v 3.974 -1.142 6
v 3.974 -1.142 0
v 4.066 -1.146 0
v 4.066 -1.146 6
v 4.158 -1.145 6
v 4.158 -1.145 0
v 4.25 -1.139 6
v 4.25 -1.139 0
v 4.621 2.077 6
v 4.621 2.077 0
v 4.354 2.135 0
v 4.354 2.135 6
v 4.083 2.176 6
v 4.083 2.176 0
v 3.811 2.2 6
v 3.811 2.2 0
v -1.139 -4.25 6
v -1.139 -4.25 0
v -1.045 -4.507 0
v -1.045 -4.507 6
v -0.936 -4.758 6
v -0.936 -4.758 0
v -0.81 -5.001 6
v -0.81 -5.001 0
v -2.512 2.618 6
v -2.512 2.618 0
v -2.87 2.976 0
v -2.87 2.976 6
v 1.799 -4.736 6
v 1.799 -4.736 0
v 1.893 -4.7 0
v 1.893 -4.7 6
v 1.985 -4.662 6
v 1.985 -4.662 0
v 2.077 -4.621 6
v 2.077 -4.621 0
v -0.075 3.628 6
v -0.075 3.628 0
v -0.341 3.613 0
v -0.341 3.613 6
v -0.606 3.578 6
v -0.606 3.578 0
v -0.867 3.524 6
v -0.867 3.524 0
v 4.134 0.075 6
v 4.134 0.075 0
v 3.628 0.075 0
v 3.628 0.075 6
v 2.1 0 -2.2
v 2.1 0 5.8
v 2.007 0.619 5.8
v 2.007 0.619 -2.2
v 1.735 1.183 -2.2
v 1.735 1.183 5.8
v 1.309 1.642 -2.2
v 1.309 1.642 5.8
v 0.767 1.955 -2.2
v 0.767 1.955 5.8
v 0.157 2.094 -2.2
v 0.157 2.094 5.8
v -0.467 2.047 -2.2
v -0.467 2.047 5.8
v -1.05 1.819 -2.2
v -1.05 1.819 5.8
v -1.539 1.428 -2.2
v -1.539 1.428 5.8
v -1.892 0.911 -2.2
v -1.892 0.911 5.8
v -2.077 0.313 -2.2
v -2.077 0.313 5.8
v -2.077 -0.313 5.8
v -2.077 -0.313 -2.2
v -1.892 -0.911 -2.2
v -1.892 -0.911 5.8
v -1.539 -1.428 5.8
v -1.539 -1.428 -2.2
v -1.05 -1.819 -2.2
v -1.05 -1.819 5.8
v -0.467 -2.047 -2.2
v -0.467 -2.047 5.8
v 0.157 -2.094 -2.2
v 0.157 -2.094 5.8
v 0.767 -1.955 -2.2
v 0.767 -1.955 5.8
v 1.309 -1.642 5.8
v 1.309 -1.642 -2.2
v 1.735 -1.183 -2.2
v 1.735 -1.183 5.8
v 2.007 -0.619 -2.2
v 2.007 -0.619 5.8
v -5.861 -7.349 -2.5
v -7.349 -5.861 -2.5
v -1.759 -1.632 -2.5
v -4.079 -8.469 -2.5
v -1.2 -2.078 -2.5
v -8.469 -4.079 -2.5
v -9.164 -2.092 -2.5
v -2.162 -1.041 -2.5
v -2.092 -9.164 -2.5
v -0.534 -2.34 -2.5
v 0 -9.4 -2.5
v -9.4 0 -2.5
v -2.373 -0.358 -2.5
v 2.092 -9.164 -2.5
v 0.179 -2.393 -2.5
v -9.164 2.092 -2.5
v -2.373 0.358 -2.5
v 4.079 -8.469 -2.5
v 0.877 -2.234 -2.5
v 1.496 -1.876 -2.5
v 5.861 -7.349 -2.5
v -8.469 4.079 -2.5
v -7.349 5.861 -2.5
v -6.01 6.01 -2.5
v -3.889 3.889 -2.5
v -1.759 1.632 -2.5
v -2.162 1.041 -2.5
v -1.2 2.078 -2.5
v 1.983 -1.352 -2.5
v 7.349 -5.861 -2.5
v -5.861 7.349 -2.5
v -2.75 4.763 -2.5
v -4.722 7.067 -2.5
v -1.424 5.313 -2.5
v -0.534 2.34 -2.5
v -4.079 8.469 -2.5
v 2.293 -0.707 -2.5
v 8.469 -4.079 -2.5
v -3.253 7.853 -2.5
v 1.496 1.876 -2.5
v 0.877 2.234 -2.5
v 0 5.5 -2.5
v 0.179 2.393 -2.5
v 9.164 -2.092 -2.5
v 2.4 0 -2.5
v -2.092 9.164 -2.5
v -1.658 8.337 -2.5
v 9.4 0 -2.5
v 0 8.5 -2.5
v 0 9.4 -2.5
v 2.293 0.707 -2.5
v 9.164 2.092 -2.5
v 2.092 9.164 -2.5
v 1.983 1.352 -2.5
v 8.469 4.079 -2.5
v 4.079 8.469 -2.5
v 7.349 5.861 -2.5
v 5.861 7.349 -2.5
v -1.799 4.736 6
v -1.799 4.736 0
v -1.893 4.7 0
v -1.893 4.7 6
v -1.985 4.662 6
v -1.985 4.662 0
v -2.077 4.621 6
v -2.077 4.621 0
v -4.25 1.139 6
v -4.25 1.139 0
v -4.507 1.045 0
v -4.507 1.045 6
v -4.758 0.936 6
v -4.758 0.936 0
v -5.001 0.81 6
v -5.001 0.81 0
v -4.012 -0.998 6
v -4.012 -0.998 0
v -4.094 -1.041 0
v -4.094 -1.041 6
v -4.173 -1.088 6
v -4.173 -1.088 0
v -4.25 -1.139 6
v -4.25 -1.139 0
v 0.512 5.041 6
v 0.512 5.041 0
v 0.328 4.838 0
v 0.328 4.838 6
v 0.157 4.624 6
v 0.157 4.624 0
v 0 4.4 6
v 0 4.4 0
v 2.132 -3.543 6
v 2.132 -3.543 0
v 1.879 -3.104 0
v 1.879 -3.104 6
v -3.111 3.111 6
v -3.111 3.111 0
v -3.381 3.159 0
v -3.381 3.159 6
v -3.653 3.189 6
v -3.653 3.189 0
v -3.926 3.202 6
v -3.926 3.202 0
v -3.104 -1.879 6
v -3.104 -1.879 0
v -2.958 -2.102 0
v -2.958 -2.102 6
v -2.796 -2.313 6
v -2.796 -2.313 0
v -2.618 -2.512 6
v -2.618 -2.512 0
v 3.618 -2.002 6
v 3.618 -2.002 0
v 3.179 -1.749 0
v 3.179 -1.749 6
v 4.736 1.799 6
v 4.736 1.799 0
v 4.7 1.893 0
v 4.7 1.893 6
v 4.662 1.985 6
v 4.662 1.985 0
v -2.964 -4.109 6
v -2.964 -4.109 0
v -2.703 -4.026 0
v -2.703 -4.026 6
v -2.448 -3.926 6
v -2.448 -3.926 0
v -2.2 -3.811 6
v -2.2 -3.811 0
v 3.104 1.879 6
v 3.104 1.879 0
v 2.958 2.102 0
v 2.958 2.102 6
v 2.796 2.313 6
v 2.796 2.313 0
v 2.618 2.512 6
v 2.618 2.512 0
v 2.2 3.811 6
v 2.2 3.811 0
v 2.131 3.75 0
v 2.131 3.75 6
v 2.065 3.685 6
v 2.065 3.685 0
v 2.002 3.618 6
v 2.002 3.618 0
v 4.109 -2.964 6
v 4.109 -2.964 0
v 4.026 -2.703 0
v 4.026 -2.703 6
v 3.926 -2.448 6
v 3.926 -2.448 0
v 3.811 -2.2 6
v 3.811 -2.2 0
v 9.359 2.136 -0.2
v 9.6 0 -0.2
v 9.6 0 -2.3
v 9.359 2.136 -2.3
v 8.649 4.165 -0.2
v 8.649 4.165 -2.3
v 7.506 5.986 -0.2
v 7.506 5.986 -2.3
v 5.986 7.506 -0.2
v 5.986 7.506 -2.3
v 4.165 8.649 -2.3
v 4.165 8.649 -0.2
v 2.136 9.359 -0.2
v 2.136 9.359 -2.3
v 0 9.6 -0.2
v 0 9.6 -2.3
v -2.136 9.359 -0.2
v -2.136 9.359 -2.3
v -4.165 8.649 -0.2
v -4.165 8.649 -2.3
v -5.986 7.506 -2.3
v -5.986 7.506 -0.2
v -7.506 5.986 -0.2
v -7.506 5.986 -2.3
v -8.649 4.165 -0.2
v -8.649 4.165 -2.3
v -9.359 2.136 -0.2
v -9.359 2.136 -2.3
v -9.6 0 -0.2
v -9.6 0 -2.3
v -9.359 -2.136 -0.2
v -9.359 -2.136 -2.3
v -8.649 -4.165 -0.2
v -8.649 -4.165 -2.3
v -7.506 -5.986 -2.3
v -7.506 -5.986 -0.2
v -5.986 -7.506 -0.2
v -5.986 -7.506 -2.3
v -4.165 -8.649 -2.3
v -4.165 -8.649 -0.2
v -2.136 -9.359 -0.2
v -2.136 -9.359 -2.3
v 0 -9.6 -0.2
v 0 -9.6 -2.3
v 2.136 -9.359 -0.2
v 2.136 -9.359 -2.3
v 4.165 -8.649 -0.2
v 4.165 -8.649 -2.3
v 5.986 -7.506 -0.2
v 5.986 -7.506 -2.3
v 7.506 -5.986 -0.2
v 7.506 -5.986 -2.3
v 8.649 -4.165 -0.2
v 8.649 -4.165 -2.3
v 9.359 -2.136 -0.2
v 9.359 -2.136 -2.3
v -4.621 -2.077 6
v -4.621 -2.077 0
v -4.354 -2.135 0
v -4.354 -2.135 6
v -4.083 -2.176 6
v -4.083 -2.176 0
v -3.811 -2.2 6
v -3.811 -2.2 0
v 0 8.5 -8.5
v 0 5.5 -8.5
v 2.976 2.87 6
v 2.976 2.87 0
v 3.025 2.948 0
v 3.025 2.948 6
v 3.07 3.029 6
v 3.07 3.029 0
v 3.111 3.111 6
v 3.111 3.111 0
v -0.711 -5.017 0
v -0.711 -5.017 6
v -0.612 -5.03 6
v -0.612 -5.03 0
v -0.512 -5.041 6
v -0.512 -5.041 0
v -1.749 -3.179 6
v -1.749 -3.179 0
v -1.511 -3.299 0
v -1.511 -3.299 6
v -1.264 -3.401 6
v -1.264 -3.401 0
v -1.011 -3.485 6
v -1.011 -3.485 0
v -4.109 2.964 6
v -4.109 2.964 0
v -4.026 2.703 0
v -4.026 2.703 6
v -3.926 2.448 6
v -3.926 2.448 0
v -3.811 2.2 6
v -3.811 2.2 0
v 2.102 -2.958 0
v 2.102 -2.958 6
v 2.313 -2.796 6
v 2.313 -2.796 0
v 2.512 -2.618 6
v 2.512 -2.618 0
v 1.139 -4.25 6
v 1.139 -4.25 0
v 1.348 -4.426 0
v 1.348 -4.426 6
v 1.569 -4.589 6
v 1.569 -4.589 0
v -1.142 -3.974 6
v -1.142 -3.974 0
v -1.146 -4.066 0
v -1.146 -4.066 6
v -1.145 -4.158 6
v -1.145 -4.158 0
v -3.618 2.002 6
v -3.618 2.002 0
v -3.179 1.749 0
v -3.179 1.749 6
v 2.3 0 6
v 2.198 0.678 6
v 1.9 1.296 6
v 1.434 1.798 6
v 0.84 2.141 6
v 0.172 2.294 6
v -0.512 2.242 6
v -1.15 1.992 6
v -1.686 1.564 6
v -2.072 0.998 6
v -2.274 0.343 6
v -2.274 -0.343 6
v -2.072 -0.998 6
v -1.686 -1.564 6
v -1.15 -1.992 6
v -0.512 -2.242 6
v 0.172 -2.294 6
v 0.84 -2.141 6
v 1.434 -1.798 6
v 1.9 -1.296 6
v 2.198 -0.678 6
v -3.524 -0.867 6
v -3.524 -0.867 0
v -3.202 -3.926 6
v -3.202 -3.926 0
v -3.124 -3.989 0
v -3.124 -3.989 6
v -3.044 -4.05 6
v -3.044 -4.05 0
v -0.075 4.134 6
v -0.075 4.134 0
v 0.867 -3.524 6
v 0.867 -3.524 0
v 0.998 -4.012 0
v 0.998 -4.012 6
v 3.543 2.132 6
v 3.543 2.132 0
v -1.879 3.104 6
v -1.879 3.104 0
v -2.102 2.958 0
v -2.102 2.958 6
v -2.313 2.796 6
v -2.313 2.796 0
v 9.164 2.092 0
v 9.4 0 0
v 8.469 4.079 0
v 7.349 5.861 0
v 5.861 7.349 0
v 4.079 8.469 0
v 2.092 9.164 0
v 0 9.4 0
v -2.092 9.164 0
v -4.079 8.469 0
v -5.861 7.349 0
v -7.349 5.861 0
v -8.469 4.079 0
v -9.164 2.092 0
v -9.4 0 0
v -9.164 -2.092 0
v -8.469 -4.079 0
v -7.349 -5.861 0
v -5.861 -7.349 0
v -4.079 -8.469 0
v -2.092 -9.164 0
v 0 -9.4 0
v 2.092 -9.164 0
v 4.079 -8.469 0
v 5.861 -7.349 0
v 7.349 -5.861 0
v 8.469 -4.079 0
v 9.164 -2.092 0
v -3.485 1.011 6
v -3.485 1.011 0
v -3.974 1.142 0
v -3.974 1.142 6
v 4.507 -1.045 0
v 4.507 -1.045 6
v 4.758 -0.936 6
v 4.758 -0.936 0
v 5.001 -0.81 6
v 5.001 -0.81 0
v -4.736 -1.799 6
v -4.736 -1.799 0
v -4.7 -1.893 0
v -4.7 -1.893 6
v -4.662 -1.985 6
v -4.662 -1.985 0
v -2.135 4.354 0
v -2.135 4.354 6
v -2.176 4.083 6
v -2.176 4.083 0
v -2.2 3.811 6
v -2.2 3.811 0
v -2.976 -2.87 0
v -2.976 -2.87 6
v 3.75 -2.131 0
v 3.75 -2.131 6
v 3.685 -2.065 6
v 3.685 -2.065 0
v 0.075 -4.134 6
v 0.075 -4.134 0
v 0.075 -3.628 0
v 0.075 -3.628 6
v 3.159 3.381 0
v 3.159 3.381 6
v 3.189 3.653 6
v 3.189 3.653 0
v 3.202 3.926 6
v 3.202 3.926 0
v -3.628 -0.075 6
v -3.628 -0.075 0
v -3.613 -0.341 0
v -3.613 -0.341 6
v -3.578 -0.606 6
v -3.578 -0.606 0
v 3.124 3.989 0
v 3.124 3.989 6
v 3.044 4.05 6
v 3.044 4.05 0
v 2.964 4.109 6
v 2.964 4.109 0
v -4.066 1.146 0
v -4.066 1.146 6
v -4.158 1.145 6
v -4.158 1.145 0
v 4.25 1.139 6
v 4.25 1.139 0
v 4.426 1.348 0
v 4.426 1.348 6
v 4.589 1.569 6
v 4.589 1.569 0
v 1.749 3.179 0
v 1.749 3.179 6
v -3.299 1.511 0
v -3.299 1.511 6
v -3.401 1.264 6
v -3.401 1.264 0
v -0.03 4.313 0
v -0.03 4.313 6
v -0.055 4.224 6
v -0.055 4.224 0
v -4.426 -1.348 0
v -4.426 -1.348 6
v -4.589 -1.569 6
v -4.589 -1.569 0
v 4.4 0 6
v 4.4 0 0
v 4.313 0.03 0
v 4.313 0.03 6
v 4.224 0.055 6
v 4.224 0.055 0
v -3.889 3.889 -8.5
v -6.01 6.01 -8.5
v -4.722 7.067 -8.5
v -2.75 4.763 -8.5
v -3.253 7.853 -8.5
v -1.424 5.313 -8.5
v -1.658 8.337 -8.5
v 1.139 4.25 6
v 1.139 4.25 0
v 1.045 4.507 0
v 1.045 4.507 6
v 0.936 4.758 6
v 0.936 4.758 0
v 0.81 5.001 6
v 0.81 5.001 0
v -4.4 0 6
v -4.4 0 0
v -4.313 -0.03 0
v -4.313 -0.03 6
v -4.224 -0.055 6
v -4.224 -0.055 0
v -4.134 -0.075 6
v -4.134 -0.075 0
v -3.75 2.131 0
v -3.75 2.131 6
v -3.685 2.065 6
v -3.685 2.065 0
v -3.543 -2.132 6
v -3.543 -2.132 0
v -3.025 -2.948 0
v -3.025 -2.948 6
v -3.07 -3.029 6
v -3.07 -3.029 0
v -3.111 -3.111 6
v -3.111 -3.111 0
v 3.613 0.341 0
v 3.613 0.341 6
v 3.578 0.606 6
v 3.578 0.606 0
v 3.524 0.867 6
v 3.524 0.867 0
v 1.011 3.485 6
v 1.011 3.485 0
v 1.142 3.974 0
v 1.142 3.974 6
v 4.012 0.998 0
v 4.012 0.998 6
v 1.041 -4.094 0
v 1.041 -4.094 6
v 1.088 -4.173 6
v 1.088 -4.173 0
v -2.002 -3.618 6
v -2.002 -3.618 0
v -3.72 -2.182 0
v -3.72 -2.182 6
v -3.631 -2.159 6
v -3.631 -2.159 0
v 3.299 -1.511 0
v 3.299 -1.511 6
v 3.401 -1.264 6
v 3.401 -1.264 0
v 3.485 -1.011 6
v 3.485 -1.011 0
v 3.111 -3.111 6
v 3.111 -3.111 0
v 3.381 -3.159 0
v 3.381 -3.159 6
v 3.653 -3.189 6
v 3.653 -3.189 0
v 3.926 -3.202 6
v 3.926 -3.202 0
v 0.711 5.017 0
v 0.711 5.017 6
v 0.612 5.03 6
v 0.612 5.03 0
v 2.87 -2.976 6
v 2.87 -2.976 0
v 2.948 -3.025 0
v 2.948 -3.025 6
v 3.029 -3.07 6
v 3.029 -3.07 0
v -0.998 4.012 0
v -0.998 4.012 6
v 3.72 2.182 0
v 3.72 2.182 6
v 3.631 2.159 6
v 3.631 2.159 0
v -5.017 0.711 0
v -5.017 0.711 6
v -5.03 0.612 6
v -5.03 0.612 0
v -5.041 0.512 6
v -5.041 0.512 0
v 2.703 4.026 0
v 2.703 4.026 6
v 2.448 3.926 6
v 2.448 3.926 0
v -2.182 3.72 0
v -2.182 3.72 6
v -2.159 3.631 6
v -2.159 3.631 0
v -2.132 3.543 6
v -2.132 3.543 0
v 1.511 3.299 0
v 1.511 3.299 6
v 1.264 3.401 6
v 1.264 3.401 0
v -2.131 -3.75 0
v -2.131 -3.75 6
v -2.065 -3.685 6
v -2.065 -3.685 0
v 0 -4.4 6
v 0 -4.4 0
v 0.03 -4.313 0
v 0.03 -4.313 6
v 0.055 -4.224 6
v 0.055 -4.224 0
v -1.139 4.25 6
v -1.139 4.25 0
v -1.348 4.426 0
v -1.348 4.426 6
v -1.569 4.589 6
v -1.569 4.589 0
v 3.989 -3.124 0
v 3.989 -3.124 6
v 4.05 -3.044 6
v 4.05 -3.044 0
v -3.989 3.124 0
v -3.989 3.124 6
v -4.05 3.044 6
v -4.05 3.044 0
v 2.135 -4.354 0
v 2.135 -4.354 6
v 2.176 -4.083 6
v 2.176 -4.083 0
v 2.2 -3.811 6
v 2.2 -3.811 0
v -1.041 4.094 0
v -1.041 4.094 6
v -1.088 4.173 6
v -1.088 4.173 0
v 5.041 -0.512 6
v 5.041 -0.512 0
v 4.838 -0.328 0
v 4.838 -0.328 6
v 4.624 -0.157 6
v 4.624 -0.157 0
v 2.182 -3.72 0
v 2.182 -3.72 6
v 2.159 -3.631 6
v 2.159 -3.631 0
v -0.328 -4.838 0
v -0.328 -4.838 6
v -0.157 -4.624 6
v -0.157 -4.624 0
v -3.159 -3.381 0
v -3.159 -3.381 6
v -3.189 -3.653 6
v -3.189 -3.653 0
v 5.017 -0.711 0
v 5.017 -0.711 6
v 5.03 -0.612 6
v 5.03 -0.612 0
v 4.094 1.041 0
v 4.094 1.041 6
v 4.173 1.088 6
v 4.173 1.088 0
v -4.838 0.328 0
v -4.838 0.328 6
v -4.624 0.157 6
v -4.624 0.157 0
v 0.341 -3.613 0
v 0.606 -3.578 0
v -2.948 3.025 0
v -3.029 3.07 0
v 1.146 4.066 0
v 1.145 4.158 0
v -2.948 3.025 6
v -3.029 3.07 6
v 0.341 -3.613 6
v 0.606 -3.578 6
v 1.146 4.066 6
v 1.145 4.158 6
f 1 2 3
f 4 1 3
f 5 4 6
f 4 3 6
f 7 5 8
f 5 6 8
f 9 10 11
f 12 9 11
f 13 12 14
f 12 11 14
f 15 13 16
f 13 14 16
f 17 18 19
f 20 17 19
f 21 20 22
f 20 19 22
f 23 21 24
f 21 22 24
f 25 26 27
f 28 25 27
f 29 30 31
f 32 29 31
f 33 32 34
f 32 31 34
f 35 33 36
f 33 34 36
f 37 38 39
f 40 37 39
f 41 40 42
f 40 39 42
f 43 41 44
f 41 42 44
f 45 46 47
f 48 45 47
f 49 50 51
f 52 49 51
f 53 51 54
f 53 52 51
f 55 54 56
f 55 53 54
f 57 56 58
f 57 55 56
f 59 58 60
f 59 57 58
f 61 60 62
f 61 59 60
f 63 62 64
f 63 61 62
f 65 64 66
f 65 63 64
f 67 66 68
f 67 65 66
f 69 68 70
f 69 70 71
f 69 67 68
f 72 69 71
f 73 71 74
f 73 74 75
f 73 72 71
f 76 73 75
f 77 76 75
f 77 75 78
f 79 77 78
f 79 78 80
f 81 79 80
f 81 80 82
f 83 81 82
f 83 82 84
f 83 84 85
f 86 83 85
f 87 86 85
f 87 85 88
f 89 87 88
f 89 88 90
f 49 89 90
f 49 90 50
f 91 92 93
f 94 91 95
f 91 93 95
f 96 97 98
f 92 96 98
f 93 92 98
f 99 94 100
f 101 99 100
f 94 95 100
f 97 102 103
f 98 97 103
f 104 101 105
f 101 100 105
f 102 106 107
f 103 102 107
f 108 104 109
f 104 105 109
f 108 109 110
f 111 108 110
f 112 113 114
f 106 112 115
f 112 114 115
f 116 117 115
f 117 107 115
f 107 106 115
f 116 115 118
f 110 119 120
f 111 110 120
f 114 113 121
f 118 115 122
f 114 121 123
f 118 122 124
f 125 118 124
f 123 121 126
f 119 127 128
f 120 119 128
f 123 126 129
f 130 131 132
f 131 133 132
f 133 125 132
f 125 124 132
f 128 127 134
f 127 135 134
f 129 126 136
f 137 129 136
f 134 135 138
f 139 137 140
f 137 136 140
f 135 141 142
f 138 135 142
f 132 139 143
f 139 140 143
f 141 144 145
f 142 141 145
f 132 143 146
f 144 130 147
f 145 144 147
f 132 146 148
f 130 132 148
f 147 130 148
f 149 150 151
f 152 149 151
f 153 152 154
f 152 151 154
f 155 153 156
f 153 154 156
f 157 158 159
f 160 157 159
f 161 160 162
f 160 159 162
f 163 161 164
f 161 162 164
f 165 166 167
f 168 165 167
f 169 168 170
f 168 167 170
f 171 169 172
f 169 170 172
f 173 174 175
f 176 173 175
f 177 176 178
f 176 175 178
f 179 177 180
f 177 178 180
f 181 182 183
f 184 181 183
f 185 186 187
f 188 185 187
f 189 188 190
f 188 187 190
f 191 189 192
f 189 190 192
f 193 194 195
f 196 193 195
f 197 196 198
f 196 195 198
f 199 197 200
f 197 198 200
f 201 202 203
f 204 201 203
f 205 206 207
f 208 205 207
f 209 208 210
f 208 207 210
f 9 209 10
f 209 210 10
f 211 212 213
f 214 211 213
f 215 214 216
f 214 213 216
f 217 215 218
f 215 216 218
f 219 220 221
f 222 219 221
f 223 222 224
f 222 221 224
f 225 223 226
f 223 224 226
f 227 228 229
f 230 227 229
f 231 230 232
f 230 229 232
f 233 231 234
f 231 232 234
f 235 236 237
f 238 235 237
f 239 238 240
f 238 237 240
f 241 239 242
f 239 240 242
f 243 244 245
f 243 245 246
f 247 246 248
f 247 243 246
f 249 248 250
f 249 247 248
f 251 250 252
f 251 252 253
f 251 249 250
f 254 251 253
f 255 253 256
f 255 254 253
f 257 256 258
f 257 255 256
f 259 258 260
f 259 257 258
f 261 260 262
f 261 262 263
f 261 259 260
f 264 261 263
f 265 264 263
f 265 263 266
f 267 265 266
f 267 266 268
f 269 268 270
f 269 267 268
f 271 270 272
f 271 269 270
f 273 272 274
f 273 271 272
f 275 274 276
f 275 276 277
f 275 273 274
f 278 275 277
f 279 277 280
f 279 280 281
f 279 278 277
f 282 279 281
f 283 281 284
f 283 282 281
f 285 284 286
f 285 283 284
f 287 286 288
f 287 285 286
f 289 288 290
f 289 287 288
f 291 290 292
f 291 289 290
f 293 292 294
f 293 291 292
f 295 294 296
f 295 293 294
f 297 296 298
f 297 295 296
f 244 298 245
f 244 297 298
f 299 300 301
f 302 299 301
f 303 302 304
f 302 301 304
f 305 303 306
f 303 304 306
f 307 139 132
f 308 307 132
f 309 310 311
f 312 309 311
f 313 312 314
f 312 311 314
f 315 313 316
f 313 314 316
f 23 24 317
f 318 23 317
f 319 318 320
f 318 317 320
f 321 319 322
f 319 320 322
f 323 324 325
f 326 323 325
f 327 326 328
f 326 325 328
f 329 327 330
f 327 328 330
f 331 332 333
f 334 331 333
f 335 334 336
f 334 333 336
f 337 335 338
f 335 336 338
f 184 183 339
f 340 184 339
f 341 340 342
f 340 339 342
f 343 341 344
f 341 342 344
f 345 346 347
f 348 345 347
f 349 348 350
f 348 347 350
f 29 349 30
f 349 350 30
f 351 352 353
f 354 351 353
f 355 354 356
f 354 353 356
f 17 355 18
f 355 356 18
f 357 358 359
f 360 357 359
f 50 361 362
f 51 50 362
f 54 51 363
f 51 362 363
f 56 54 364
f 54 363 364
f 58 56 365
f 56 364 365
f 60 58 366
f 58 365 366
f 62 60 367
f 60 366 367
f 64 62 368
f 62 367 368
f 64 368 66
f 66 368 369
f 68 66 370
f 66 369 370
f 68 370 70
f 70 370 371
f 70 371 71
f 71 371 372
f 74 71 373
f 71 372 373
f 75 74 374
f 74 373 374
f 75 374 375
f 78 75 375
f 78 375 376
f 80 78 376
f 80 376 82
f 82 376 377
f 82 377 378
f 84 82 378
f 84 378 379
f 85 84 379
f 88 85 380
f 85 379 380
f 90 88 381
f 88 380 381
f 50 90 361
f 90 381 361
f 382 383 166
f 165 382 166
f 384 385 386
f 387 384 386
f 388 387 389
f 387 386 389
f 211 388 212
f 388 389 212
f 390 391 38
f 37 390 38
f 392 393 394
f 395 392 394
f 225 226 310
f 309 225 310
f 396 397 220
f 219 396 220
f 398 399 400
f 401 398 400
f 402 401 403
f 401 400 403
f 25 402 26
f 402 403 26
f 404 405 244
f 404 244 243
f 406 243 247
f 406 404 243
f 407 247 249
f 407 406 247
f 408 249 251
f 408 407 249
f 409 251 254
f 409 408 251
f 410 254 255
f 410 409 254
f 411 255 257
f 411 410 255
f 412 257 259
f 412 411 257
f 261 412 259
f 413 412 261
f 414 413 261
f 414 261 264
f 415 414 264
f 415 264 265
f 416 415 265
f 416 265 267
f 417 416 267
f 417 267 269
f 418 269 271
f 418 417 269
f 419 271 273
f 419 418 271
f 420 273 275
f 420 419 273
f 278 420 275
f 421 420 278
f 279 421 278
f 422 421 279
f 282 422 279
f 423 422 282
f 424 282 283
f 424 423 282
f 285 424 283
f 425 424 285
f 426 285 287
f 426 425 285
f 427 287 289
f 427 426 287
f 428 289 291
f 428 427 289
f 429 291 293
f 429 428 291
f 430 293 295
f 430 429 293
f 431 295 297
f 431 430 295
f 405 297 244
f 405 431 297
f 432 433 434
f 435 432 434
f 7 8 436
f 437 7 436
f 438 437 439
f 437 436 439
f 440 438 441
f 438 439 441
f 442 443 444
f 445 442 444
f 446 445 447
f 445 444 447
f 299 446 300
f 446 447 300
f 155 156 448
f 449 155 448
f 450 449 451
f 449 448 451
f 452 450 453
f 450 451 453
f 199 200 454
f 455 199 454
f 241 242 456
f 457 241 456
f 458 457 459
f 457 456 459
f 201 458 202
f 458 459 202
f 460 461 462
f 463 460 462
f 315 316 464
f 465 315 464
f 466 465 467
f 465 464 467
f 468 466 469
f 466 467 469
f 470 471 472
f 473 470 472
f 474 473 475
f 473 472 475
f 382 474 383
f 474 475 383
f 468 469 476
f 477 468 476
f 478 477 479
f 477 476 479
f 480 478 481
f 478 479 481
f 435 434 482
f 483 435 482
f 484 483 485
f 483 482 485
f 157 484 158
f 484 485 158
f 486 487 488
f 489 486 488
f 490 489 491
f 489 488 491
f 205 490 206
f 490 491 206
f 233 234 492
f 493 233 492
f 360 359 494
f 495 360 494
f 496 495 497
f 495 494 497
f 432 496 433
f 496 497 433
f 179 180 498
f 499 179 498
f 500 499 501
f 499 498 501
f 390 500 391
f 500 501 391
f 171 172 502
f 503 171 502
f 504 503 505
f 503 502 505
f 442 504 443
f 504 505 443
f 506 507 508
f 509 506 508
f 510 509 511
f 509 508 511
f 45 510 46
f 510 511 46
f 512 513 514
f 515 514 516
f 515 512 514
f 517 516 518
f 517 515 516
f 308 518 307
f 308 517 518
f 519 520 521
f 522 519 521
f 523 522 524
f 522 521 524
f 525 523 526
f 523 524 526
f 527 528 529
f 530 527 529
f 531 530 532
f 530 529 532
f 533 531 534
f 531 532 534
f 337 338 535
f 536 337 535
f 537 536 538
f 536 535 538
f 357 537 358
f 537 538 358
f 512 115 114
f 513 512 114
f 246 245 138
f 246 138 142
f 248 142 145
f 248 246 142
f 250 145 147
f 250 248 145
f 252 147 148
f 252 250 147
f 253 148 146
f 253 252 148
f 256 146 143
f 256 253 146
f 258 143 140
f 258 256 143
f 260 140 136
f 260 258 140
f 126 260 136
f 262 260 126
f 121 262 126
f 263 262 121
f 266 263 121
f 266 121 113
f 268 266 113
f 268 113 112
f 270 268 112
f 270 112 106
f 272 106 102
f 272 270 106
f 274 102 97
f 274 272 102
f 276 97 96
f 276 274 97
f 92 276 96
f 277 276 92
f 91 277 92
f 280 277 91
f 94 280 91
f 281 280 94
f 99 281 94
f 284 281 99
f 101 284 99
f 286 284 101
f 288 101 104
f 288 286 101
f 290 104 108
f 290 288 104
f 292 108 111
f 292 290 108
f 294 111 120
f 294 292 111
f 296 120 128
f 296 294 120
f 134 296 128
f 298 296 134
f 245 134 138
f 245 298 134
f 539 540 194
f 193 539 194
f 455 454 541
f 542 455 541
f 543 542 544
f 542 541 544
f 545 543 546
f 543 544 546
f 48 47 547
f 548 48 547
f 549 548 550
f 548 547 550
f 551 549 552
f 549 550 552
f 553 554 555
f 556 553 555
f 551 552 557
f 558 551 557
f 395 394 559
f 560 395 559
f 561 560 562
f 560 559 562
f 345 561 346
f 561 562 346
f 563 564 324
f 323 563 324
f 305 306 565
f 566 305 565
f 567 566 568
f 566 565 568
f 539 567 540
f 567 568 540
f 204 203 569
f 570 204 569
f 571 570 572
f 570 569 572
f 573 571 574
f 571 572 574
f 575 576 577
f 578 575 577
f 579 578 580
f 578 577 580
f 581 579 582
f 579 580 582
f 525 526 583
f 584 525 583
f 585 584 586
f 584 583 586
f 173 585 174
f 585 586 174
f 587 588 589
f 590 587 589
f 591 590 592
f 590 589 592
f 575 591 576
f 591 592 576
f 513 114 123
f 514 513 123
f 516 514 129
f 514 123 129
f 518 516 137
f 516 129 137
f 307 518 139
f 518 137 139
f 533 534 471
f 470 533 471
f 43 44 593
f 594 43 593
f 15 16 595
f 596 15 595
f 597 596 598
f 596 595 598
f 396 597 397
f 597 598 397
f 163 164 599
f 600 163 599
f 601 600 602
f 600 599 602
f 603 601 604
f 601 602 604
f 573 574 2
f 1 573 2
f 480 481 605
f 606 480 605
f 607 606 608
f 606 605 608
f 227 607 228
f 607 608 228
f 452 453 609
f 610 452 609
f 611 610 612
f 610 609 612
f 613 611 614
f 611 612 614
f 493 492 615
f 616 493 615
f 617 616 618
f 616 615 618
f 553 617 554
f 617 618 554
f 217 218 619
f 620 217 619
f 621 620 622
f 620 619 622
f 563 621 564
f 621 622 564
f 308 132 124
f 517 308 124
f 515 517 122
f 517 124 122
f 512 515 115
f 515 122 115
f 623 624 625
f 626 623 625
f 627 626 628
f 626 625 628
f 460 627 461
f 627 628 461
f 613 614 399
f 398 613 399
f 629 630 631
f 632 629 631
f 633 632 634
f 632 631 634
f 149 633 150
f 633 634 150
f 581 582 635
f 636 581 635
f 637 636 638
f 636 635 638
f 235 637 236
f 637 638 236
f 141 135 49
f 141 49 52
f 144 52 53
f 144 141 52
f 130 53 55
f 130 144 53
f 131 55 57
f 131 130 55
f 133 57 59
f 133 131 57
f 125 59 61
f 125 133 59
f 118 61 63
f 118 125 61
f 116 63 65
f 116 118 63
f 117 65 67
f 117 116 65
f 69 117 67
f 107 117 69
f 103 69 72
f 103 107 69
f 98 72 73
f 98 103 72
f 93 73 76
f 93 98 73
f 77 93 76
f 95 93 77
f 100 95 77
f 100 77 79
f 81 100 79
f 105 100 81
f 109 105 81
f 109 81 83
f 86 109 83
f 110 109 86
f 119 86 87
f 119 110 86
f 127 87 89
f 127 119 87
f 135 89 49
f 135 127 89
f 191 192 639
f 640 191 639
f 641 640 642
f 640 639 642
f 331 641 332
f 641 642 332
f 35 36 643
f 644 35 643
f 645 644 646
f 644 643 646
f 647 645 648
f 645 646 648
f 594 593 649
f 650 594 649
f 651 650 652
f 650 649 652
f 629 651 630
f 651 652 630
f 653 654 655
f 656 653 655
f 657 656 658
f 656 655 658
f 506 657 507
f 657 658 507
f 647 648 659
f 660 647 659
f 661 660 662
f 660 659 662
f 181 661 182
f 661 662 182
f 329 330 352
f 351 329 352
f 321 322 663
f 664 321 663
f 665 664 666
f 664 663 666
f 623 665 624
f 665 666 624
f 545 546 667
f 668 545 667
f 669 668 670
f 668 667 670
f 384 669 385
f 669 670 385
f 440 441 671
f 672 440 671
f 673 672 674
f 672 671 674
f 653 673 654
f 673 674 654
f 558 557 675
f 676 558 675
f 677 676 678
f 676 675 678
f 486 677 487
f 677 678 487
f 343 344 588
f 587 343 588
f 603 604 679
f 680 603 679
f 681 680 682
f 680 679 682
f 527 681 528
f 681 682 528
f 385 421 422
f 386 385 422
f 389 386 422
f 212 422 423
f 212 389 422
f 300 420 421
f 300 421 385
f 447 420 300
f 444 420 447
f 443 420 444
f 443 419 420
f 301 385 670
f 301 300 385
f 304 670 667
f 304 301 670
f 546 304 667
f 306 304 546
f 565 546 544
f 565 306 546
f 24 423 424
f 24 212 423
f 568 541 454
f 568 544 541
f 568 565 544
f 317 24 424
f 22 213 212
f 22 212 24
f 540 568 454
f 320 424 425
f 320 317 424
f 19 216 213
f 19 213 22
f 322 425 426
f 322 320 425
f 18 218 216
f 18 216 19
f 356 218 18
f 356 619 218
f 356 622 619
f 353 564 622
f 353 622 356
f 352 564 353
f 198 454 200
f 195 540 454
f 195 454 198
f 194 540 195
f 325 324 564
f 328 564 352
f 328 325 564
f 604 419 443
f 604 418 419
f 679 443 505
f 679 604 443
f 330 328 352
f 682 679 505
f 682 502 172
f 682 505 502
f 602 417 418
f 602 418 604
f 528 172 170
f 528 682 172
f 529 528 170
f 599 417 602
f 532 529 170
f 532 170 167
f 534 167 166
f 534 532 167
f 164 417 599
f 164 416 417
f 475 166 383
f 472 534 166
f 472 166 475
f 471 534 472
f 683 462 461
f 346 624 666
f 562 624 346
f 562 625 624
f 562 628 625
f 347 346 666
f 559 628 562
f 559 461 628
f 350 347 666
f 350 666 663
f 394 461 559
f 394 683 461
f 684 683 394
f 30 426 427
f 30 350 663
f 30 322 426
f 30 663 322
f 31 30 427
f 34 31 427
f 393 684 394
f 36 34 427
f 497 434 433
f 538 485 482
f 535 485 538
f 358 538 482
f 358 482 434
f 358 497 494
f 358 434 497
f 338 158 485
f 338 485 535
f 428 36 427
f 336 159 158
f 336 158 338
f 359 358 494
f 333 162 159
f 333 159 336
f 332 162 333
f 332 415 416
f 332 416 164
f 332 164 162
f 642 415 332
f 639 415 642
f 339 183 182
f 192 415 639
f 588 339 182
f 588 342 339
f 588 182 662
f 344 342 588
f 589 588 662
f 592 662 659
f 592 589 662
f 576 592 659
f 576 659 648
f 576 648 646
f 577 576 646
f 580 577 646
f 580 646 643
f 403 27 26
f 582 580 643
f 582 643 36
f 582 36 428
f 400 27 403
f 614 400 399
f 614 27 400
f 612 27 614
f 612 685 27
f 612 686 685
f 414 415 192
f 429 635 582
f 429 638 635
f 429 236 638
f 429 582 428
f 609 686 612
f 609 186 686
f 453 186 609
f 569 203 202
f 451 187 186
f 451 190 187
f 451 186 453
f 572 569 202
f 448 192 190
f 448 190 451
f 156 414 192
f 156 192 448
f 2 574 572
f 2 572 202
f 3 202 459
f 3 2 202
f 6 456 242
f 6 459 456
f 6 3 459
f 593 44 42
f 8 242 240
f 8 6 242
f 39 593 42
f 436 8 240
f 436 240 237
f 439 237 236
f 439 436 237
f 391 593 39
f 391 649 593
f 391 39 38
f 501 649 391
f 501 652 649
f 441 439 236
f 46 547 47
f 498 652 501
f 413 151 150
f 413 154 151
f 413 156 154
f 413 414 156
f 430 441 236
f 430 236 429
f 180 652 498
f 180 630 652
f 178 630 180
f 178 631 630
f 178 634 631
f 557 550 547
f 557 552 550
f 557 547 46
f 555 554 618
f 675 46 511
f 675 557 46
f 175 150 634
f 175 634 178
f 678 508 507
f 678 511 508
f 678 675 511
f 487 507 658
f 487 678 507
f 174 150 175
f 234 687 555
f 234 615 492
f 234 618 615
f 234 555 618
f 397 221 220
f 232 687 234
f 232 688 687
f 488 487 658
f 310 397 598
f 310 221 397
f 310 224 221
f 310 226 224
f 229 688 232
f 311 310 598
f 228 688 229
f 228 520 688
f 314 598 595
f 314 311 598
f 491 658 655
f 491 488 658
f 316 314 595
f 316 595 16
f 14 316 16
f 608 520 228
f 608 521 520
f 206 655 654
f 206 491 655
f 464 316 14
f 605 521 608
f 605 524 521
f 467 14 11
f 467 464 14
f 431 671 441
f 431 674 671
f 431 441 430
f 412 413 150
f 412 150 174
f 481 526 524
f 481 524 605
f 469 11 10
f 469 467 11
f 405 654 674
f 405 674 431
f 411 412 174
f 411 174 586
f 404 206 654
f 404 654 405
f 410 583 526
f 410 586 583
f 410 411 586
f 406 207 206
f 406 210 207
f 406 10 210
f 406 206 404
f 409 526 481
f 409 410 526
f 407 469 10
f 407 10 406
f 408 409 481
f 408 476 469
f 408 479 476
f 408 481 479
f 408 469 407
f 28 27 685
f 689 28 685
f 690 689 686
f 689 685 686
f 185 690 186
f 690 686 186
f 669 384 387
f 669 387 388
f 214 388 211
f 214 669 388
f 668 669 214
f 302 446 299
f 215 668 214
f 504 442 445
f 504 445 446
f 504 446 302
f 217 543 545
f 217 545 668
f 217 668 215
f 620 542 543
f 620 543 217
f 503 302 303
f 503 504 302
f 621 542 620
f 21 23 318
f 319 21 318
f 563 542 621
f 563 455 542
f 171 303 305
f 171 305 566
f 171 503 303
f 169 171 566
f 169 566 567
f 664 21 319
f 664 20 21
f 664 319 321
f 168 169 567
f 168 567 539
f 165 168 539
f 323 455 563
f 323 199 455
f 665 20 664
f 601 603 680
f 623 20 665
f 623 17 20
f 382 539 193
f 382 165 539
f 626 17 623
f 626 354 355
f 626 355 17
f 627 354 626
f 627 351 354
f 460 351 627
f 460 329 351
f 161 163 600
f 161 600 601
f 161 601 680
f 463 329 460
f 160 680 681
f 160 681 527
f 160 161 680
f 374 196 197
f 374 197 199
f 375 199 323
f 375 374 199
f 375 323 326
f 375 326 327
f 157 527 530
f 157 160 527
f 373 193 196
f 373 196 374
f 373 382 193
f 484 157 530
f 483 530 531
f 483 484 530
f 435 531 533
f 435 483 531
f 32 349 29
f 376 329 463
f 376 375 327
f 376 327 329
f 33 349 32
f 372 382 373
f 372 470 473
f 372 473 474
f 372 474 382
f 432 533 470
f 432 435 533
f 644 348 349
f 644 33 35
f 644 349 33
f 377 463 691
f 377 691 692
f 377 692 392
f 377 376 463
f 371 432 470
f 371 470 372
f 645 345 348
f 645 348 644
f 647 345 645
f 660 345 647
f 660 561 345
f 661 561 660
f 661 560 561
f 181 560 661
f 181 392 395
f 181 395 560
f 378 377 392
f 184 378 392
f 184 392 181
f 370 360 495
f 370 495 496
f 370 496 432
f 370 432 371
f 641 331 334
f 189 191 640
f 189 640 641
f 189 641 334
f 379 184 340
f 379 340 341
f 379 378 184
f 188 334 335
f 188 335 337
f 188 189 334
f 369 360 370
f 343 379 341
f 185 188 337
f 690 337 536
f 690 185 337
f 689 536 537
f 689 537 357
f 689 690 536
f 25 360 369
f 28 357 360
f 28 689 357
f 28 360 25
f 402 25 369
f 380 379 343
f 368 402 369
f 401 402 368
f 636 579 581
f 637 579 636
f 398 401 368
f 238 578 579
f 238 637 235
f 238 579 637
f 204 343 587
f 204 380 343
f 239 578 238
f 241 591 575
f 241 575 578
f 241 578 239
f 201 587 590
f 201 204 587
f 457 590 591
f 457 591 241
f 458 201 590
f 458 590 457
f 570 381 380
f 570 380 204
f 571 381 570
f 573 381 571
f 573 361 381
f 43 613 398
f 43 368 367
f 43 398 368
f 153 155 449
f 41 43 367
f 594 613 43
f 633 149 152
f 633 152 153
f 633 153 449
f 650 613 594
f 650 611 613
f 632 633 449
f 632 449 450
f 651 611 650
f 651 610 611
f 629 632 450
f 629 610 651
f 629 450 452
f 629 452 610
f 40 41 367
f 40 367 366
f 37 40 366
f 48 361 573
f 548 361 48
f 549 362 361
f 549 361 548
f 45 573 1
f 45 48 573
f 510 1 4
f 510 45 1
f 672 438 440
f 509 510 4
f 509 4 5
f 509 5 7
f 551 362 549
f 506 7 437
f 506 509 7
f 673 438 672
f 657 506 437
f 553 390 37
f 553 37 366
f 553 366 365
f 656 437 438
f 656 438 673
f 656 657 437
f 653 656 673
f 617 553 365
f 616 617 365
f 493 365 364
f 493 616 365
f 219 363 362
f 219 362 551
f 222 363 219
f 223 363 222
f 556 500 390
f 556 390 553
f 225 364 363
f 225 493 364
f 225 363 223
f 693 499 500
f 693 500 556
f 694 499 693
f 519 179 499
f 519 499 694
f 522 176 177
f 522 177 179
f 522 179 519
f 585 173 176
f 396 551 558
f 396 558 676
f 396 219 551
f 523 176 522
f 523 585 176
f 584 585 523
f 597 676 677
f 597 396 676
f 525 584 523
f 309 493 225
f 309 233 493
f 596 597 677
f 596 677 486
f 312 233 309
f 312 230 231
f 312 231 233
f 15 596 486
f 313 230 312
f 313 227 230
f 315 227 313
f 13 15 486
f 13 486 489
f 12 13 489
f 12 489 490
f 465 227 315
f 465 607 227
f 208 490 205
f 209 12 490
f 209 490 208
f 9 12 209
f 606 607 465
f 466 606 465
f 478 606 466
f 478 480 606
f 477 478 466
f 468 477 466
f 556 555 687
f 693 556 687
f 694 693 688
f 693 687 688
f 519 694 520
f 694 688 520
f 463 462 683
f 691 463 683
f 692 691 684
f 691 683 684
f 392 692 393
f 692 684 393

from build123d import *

# Parameters (mm, degrees)
F0_R     = 9.6
F0_R_2   = 2.1
F1_DEPTH = 2.5
F3_DEPTH = 6
F4_R     = 2.1
F5_DEPTH = 6
F6_SIZE  = 0.3
F7_SIZE  = 0.2
F8_SIZE  = 0.2


with BuildPart() as f1:
    # F0 (on Top) → F1 (new body)
    with BuildSketch(Plane.XY):
        Circle(F0_R)
        Circle(F0_R_2, mode=Mode.SUBTRACT)
    extrude(amount=-F1_DEPTH)

    # F2 (on face) → F3 (join)
    with BuildSketch(Plane(origin=(0, 0, -2.5), x_dir=(1, 0, 0), z_dir=(0, 0, -1))):
        with BuildLine():
            Line((-3.889087, -3.889087), (-6.010408, -6.010408))
            ThreePointArc((-6.010408, -6.010408), (-3.252809, -7.852976), (0, -8.5))
            Line((0, -8.5), (0, -5.5))
            ThreePointArc((0, -5.5), (-2.104759, -5.081337), (-3.889087, -3.889087))
        make_face()
    extrude(amount=F3_DEPTH)

    # F4 (on face) → F5 (join)
    with BuildSketch(Plane.XY):
        with BuildLine():
            ThreePointArc((-3.11127, 3.11127), (-3.516618, 3.176372), (-3.926339, 3.202339))
            ThreePointArc((-3.926339, 3.202339), (-4.019657, 3.084391), (-4.109433, 2.963726))
            ThreePointArc((-4.109433, 2.963726), (-3.978308, 2.574687), (-3.810512, 2.2))
            ThreePointArc((-3.810512, 2.2), (-3.717923, 2.097301), (-3.617501, 2.002248))
            Line((-3.617501, 2.002248), (-3.179227, 1.749211))
            ThreePointArc((-3.179227, 1.749211), (-2.878815, 2.208992), (-2.512452, 2.618168))
            Line((-2.512452, 2.618168), (-2.870301, 2.976017))
            ThreePointArc((-2.870301, 2.976017), (-2.988107, 3.048416), (-3.11127, 3.11127))
        make_face()
        with BuildLine():
            ThreePointArc((-1.878686, 3.104474), (-2.208992, 2.878815), (-2.512452, 2.618168))
            ThreePointArc((-2.512452, 2.618168), (-2.878815, 2.208992), (-3.179227, 1.749211))
            ThreePointArc((-3.179227, 1.749211), (-3.352451, 1.388631), (-3.484932, 1.011174))
            ThreePointArc((-3.484932, 1.011174), (-3.597623, 0.473636), (-3.627897, -0.074753))
            ThreePointArc((-3.627897, -0.074753), (-3.597623, -0.473636), (-3.523626, -0.866763))
            ThreePointArc((-3.523626, -0.866763), (-3.352451, -1.388631), (-3.104474, -1.878686))
            ThreePointArc((-3.104474, -1.878686), (-2.878815, -2.208992), (-2.618168, -2.512452))
            ThreePointArc((-2.618168, -2.512452), (-2.208992, -2.878815), (-1.749211, -3.179227))
            ThreePointArc((-1.749211, -3.179227), (-1.388631, -3.352451), (-1.011174, -3.484932))
            ThreePointArc((-1.011174, -3.484932), (-0.473636, -3.597623), (0.074753, -3.627897))
            ThreePointArc((0.074753, -3.627897), (0.473636, -3.597623), (0.866763, -3.523626))
            ThreePointArc((0.866763, -3.523626), (1.388631, -3.352451), (1.878686, -3.104474))
            ThreePointArc((1.878686, -3.104474), (2.208992, -2.878815), (2.512452, -2.618168))
            ThreePointArc((2.512452, -2.618168), (2.878815, -2.208992), (3.179227, -1.749211))
            ThreePointArc((3.179227, -1.749211), (3.352451, -1.388631), (3.484932, -1.011174))
            ThreePointArc((3.484932, -1.011174), (3.592553, -0.510669), (3.628667, 0))
            ThreePointArc((3.628667, 0), (3.628474, 0.037378), (3.627897, 0.074753))
            ThreePointArc((3.627897, 0.074753), (3.597623, 0.473636), (3.523626, 0.866763))
            ThreePointArc((3.523626, 0.866763), (3.352451, 1.388631), (3.104474, 1.878686))
            ThreePointArc((3.104474, 1.878686), (2.878815, 2.208992), (2.618168, 2.512452))
            ThreePointArc((2.618168, 2.512452), (2.208992, 2.878815), (1.749211, 3.179227))
            ThreePointArc((1.749211, 3.179227), (1.388631, 3.352451), (1.011174, 3.484932))
            ThreePointArc((1.011174, 3.484932), (0.473636, 3.597623), (-0.074753, 3.627897))
            ThreePointArc((-0.074753, 3.627897), (-0.473636, 3.597623), (-0.866763, 3.523626))
            ThreePointArc((-0.866763, 3.523626), (-1.388631, 3.352451), (-1.878686, 3.104474))
        make_face()
        Circle(F4_R, mode=Mode.SUBTRACT)
        with BuildLine():
            Line((-2.131723, 3.542748), (-1.878686, 3.104474))
            ThreePointArc((-1.878686, 3.104474), (-1.388631, 3.352451), (-0.866763, 3.523626))
            Line((-0.866763, 3.523626), (-0.997745, 4.012457))
            ThreePointArc((-0.997745, 4.012457), (-1.063568, 4.134059), (-1.138804, 4.250074))
            ThreePointArc((-1.138804, 4.250074), (-1.457294, 4.509128), (-1.79914, 4.736476))
            ThreePointArc((-1.79914, 4.736476), (-1.938929, 4.68099), (-2.07701, 4.621378))
            ThreePointArc((-2.07701, 4.621378), (-2.157972, 4.218898), (-2.2, 3.810512))
            ThreePointArc((-2.2, 3.810512), (-2.171165, 3.675278), (-2.131723, 3.542748))
        make_face()
        with BuildLine():
            ThreePointArc((-3.627897, -0.074753), (-3.597623, 0.473636), (-3.484932, 1.011174))
            Line((-3.484932, 1.011174), (-3.973763, 1.142156))
            ThreePointArc((-3.973763, 1.142156), (-4.111985, 1.145953), (-4.250074, 1.138804))
            ThreePointArc((-4.250074, 1.138804), (-4.633667, 0.99251), (-5.001479, 0.810137))
            ThreePointArc((-5.001479, 0.810137), (-5.023321, 0.661333), (-5.040736, 0.511946))
            ThreePointArc((-5.040736, 0.511946), (-4.732659, 0.24059), (-4.4, 0))
            ThreePointArc((-4.4, 0), (-4.268466, -0.042645), (-4.133972, -0.074753))
            Line((-4.133972, -0.074753), (-3.627897, -0.074753))
        make_face()
        with BuildLine():
            Line((-0.074753, 4.133972), (-0.074753, 3.627897))
            ThreePointArc((-0.074753, 3.627897), (0.473636, 3.597623), (1.011174, 3.484932))
            Line((1.011174, 3.484932), (1.142156, 3.973763))
            ThreePointArc((1.142156, 3.973763), (1.145953, 4.111985), (1.138804, 4.250074))
            ThreePointArc((1.138804, 4.250074), (0.99251, 4.633667), (0.810137, 5.001479))
            ThreePointArc((0.810137, 5.001479), (0.661333, 5.023321), (0.511946, 5.040736))
            ThreePointArc((0.511946, 5.040736), (0.24059, 4.732659), (0, 4.4))
            ThreePointArc((0, 4.4), (-0.042645, 4.268466), (-0.074753, 4.133972))
        make_face()
        with BuildLine():
            ThreePointArc((-3.104474, -1.878686), (-3.352451, -1.388631), (-3.523626, -0.866763))
            Line((-3.523626, -0.866763), (-4.012457, -0.997745))
            ThreePointArc((-4.012457, -0.997745), (-4.134059, -1.063568), (-4.250074, -1.138804))
            ThreePointArc((-4.250074, -1.138804), (-4.509128, -1.457294), (-4.736476, -1.79914))
            ThreePointArc((-4.736476, -1.79914), (-4.68099, -1.938929), (-4.621378, -2.07701))
            ThreePointArc((-4.621378, -2.07701), (-4.218898, -2.157972), (-3.810512, -2.2))
            ThreePointArc((-3.810512, -2.2), (-3.675278, -2.171165), (-3.542748, -2.131723))
            Line((-3.542748, -2.131723), (-3.104474, -1.878686))
        make_face()
        with BuildLine():
            Line((2.002248, 3.617501), (1.749211, 3.179227))
            ThreePointArc((1.749211, 3.179227), (2.208992, 2.878815), (2.618168, 2.512452))
            Line((2.618168, 2.512452), (2.976017, 2.870301))
            ThreePointArc((2.976017, 2.870301), (3.048416, 2.988107), (3.11127, 3.11127))
            ThreePointArc((3.11127, 3.11127), (3.176372, 3.516618), (3.202339, 3.926339))
            ThreePointArc((3.202339, 3.926339), (3.084391, 4.019657), (2.963726, 4.109433))
            ThreePointArc((2.963726, 4.109433), (2.574687, 3.978308), (2.2, 3.810512))
            ThreePointArc((2.2, 3.810512), (2.097301, 3.717923), (2.002248, 3.617501))
        make_face()
        with BuildLine():
            ThreePointArc((-1.749211, -3.179227), (-2.208992, -2.878815), (-2.618168, -2.512452))
            Line((-2.618168, -2.512452), (-2.976017, -2.870301))
            ThreePointArc((-2.976017, -2.870301), (-3.048416, -2.988107), (-3.11127, -3.11127))
            ThreePointArc((-3.11127, -3.11127), (-3.176372, -3.516618), (-3.202339, -3.926339))
            ThreePointArc((-3.202339, -3.926339), (-3.084391, -4.019657), (-2.963726, -4.109433))
            ThreePointArc((-2.963726, -4.109433), (-2.574687, -3.978308), (-2.2, -3.810512))
            ThreePointArc((-2.2, -3.810512), (-2.097301, -3.717923), (-2.002248, -3.617501))
            Line((-2.002248, -3.617501), (-1.749211, -3.179227))
        make_face()
        with BuildLine():
            Line((3.542748, 2.131723), (3.104474, 1.878686))
            ThreePointArc((3.104474, 1.878686), (3.352451, 1.388631), (3.523626, 0.866763))
            Line((3.523626, 0.866763), (4.012457, 0.997745))
            ThreePointArc((4.012457, 0.997745), (4.134059, 1.063568), (4.250074, 1.138804))
            ThreePointArc((4.250074, 1.138804), (4.509128, 1.457294), (4.736476, 1.79914))
            ThreePointArc((4.736476, 1.79914), (4.68099, 1.938929), (4.621378, 2.07701))
            ThreePointArc((4.621378, 2.07701), (4.218898, 2.157972), (3.810512, 2.2))
            ThreePointArc((3.810512, 2.2), (3.675278, 2.171165), (3.542748, 2.131723))
        make_face()
        with BuildLine():
            ThreePointArc((0.074753, -3.627897), (-0.473636, -3.597623), (-1.011174, -3.484932))
            Line((-1.011174, -3.484932), (-1.142156, -3.973763))
            ThreePointArc((-1.142156, -3.973763), (-1.145953, -4.111985), (-1.138804, -4.250074))
            ThreePointArc((-1.138804, -4.250074), (-0.99251, -4.633667), (-0.810137, -5.001479))
            ThreePointArc((-0.810137, -5.001479), (-0.661333, -5.023321), (-0.511946, -5.040736))
            ThreePointArc((-0.511946, -5.040736), (-0.24059, -4.732659), (0, -4.4))
            ThreePointArc((0, -4.4), (0.042645, -4.268466), (0.074753, -4.133972))
            Line((0.074753, -4.133972), (0.074753, -3.627897))
        make_face()
        with BuildLine():
            Line((4.133972, 0.074753), (3.627897, 0.074753))
            ThreePointArc((3.627897, 0.074753), (3.628474, 0.037378), (3.628667, 0))
            ThreePointArc((3.628667, 0), (3.592553, -0.510669), (3.484932, -1.011174))
            Line((3.484932, -1.011174), (3.973763, -1.142156))
            ThreePointArc((3.973763, -1.142156), (4.111985, -1.145953), (4.250074, -1.138804))
            ThreePointArc((4.250074, -1.138804), (4.633667, -0.99251), (5.001479, -0.810137))
            ThreePointArc((5.001479, -0.810137), (5.023321, -0.661333), (5.040736, -0.511946))
            ThreePointArc((5.040736, -0.511946), (4.732659, -0.24059), (4.4, 0))
            ThreePointArc((4.4, 0), (4.268466, 0.042645), (4.133972, 0.074753))
        make_face()
        with BuildLine():
            ThreePointArc((1.878686, -3.104474), (1.388631, -3.352451), (0.866763, -3.523626))
            Line((0.866763, -3.523626), (0.997745, -4.012457))
            ThreePointArc((0.997745, -4.012457), (1.063568, -4.134059), (1.138804, -4.250074))
            ThreePointArc((1.138804, -4.250074), (1.457294, -4.509128), (1.79914, -4.736476))
            ThreePointArc((1.79914, -4.736476), (1.938929, -4.68099), (2.07701, -4.621378))
            ThreePointArc((2.07701, -4.621378), (2.157972, -4.218898), (2.2, -3.810512))
            ThreePointArc((2.2, -3.810512), (2.171165, -3.675278), (2.131723, -3.542748))
            Line((2.131723, -3.542748), (1.878686, -3.104474))
        make_face()
        with BuildLine():
            ThreePointArc((3.179227, -1.749211), (2.878815, -2.208992), (2.512452, -2.618168))
            Line((2.512452, -2.618168), (2.870301, -2.976017))
            ThreePointArc((2.870301, -2.976017), (2.988107, -3.048416), (3.11127, -3.11127))
            ThreePointArc((3.11127, -3.11127), (3.516618, -3.176372), (3.926339, -3.202339))
            ThreePointArc((3.926339, -3.202339), (4.019657, -3.084391), (4.109433, -2.963726))
            ThreePointArc((4.109433, -2.963726), (3.978308, -2.574687), (3.810512, -2.2))
            ThreePointArc((3.810512, -2.2), (3.717923, -2.097301), (3.617501, -2.002248))
            Line((3.617501, -2.002248), (3.179227, -1.749211))
        make_face()
    extrude(amount=F5_DEPTH)

    # F6
    f6_edges = [f1.edges().sort_by_distance(p)[0] for p in [
        (-2.1, 0, -2.5),
    ]]
    chamfer(f6_edges, length=F6_SIZE)

    # F7
    f7_edges = [f1.edges().sort_by_distance(p)[0] for p in [
        (-2.1, 0, 6),
    ]]
    chamfer(f7_edges, length=F7_SIZE)

    # F8
    f8_edges = [f1.edges().sort_by_distance(p)[0] for p in [
        (-9.6, 0, -2.5),
        (-9.6, 0, 0),
    ]]
    chamfer(f8_edges, length=F8_SIZE)


solid = f1.part
